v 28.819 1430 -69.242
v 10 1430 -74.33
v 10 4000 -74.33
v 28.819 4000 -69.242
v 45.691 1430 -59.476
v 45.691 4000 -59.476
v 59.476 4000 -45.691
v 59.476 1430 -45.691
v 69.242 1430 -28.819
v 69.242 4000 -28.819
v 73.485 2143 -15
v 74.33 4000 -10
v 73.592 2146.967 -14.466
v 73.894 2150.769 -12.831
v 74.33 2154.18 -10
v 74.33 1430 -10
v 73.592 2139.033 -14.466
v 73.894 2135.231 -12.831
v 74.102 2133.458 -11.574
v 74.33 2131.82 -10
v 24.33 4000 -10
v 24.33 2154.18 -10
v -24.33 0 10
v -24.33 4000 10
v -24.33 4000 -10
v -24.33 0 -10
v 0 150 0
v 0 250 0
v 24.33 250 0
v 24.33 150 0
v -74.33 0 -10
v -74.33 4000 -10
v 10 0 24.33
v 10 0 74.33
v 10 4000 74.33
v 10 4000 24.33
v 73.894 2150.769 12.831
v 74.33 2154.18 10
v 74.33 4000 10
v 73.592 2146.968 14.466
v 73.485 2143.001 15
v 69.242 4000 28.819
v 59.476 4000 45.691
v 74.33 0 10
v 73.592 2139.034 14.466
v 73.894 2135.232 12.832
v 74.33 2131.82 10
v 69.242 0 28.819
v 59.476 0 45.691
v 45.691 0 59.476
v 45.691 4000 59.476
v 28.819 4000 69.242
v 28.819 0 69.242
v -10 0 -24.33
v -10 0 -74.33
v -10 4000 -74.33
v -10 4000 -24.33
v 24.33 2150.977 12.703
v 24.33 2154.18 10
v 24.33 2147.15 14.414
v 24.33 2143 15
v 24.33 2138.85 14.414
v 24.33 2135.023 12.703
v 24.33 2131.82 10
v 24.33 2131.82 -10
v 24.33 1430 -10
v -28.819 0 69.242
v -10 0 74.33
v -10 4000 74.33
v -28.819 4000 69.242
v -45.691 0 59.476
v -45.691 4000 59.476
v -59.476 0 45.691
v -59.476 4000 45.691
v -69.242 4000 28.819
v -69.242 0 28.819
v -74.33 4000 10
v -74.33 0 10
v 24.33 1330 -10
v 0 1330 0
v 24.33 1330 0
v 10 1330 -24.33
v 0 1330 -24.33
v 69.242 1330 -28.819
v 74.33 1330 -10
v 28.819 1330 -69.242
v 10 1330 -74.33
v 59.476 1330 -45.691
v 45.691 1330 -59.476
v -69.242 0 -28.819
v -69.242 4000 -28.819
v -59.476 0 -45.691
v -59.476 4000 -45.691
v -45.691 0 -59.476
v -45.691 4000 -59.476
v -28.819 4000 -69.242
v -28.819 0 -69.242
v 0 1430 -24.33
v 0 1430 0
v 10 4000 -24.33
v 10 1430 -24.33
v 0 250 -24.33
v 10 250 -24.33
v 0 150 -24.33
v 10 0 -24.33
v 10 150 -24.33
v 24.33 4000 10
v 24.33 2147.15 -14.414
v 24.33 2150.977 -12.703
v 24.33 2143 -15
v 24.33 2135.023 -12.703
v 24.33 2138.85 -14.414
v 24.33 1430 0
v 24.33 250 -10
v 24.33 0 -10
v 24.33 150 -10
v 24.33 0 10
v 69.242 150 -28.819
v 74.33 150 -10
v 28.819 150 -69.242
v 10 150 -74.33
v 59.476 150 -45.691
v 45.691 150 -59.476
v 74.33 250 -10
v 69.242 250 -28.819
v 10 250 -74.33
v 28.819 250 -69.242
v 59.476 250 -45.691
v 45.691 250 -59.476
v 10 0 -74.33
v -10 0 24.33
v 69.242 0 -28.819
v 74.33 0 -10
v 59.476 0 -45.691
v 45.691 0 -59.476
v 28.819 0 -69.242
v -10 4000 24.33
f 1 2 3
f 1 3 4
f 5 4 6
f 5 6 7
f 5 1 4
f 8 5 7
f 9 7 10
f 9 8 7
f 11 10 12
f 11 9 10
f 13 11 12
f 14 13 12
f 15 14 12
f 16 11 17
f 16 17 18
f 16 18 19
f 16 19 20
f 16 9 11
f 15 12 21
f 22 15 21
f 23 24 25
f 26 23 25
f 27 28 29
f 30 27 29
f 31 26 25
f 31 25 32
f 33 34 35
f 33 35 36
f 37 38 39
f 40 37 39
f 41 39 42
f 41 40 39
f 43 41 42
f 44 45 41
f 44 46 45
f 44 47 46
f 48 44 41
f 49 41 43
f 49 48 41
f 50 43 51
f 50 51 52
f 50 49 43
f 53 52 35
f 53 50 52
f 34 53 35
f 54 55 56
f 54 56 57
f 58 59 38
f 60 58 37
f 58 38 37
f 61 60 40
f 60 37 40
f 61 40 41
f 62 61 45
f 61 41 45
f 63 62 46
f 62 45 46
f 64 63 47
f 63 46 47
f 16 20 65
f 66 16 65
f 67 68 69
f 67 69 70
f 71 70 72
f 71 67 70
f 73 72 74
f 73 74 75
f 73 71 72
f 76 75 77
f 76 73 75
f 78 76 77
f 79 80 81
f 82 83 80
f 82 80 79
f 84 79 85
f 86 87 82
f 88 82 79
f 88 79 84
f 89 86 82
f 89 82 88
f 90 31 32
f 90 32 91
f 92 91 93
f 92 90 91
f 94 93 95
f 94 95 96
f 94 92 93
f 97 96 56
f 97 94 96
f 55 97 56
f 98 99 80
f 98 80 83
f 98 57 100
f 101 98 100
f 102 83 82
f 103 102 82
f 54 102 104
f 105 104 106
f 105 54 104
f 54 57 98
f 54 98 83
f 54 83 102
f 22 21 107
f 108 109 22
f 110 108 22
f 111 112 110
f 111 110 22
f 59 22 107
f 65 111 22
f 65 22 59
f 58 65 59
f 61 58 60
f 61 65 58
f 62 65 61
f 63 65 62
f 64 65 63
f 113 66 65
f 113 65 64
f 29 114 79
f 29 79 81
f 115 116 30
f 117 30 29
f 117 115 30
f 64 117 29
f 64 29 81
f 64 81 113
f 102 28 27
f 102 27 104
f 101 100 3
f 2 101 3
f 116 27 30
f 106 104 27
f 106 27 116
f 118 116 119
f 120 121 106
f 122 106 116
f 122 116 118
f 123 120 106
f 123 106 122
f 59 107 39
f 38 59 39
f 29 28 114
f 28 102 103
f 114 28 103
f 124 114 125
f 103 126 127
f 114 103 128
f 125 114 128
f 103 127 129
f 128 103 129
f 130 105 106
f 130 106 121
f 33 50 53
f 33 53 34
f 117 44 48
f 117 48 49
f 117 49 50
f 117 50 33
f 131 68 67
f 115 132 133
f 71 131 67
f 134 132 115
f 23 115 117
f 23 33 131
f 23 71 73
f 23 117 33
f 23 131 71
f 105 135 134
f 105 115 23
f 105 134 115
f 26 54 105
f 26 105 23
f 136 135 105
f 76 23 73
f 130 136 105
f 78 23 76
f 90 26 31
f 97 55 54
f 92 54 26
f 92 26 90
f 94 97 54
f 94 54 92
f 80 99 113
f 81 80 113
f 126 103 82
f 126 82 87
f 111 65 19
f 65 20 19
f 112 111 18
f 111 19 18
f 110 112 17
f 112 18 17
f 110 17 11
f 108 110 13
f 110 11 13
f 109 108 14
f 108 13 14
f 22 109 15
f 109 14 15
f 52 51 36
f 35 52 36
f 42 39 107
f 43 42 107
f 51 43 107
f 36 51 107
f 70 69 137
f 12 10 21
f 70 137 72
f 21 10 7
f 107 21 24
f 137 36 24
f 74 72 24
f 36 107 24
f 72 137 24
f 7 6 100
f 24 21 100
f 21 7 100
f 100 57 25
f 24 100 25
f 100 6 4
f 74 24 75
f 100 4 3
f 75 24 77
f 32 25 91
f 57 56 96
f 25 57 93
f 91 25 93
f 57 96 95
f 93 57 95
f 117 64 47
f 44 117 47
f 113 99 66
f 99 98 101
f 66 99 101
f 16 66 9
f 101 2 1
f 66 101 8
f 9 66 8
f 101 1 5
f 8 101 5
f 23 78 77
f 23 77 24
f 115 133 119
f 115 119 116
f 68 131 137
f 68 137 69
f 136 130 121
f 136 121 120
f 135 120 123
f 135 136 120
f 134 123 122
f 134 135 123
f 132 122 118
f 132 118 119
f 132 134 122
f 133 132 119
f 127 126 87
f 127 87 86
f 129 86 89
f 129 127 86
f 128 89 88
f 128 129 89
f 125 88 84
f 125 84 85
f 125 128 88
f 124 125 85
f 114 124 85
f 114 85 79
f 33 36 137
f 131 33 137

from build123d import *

# Parameters (mm, degrees)
BOSS_EXTRUDE2_DEPTH = 4000
CUT_EXTRUDE1_START  = 200
SKETCH2_W           = 74.330343737
SKETCH2_H           = 74.330343737
CUT_EXTRUDE1_DEPTH  = 50
CUT_EXTRUDE2_START  = 1380
SKETCH2_2_W         = 74.330343737
SKETCH2_2_H         = 74.330343737
CUT_EXTRUDE2_DEPTH  = 50
SKETCH3_R           = 15
CUT_EXTRUDE3_DEPTH  = 50


with BuildPart() as part:
    # Sketch1 → Boss-Extrude2 (new body)
    with BuildSketch(Plane(origin=(0, 0, 0), x_dir=(1, 0, 0), z_dir=(0, 1, 0))):
        with BuildLine():
            Line((-10, 74.330343737), (-10, 24.330343737))
            Line((-10, 24.330343737), (10, 24.330343737))
            Line((10, 24.330343737), (10, 74.330343737))
            ThreePointArc((10, 74.330343737), (53.033008589, 53.033008589), (74.330343737, 10))
            Line((74.330343737, 10), (24.330343737, 10))
            Line((24.330343737, 10), (24.330343737, -10))
            Line((24.330343737, -10), (74.330343737, -10))
            ThreePointArc((74.330343737, -10), (53.033008589, -53.033008589), (10, -74.330343737))
            Line((10, -74.330343737), (10, -24.330343737))
            Line((10, -24.330343737), (-10, -24.330343737))
            Line((-10, -24.330343737), (-10, -74.330343737))
            ThreePointArc((-10, -74.330343737), (-53.033008589, -53.033008589), (-74.330343737, -10))
            Line((-74.330343737, -10), (-24.330343737, -10))
            Line((-24.330343737, -10), (-24.330343737, 10))
            Line((-24.330343737, 10), (-74.330343737, 10))
            ThreePointArc((-74.330343737, 10), (-53.033008589, 53.033008589), (-10, 74.330343737))
        make_face()
    extrude(amount=BOSS_EXTRUDE2_DEPTH)

    # Sketch2 → Cut-Extrude1 (cut, symmetric)
    with BuildSketch(Plane(origin=(0, 0, 0), x_dir=(1, 0, 0), z_dir=(0, 1, 0)).offset(CUT_EXTRUDE1_START)):
        with Locations((37.165171869, 37.165171869)):
            Rectangle(SKETCH2_W, SKETCH2_H)
    extrude(amount=CUT_EXTRUDE1_DEPTH, both=True, mode=Mode.SUBTRACT)

    # Sketch2<2> → Cut-Extrude2 (cut, symmetric)
    with BuildSketch(Plane(origin=(0, 0, 0), x_dir=(1, 0, 0), z_dir=(0, 1, 0)).offset(CUT_EXTRUDE2_START)):
        with Locations((37.165171869, 37.165171869)):
            Rectangle(SKETCH2_2_W, SKETCH2_2_H)
    extrude(amount=CUT_EXTRUDE2_DEPTH, both=True, mode=Mode.SUBTRACT)

    # Sketch3 → Cut-Extrude3 (cut)
    with BuildSketch(Plane(origin=(74.330343737, 0, 0), x_dir=(0, 0, -1), z_dir=(1, 0, 0))):
        with Locations((0, 2143)):
            Circle(SKETCH3_R)
    extrude(amount=-CUT_EXTRUDE3_DEPTH, mode=Mode.SUBTRACT)


solid = part.part
